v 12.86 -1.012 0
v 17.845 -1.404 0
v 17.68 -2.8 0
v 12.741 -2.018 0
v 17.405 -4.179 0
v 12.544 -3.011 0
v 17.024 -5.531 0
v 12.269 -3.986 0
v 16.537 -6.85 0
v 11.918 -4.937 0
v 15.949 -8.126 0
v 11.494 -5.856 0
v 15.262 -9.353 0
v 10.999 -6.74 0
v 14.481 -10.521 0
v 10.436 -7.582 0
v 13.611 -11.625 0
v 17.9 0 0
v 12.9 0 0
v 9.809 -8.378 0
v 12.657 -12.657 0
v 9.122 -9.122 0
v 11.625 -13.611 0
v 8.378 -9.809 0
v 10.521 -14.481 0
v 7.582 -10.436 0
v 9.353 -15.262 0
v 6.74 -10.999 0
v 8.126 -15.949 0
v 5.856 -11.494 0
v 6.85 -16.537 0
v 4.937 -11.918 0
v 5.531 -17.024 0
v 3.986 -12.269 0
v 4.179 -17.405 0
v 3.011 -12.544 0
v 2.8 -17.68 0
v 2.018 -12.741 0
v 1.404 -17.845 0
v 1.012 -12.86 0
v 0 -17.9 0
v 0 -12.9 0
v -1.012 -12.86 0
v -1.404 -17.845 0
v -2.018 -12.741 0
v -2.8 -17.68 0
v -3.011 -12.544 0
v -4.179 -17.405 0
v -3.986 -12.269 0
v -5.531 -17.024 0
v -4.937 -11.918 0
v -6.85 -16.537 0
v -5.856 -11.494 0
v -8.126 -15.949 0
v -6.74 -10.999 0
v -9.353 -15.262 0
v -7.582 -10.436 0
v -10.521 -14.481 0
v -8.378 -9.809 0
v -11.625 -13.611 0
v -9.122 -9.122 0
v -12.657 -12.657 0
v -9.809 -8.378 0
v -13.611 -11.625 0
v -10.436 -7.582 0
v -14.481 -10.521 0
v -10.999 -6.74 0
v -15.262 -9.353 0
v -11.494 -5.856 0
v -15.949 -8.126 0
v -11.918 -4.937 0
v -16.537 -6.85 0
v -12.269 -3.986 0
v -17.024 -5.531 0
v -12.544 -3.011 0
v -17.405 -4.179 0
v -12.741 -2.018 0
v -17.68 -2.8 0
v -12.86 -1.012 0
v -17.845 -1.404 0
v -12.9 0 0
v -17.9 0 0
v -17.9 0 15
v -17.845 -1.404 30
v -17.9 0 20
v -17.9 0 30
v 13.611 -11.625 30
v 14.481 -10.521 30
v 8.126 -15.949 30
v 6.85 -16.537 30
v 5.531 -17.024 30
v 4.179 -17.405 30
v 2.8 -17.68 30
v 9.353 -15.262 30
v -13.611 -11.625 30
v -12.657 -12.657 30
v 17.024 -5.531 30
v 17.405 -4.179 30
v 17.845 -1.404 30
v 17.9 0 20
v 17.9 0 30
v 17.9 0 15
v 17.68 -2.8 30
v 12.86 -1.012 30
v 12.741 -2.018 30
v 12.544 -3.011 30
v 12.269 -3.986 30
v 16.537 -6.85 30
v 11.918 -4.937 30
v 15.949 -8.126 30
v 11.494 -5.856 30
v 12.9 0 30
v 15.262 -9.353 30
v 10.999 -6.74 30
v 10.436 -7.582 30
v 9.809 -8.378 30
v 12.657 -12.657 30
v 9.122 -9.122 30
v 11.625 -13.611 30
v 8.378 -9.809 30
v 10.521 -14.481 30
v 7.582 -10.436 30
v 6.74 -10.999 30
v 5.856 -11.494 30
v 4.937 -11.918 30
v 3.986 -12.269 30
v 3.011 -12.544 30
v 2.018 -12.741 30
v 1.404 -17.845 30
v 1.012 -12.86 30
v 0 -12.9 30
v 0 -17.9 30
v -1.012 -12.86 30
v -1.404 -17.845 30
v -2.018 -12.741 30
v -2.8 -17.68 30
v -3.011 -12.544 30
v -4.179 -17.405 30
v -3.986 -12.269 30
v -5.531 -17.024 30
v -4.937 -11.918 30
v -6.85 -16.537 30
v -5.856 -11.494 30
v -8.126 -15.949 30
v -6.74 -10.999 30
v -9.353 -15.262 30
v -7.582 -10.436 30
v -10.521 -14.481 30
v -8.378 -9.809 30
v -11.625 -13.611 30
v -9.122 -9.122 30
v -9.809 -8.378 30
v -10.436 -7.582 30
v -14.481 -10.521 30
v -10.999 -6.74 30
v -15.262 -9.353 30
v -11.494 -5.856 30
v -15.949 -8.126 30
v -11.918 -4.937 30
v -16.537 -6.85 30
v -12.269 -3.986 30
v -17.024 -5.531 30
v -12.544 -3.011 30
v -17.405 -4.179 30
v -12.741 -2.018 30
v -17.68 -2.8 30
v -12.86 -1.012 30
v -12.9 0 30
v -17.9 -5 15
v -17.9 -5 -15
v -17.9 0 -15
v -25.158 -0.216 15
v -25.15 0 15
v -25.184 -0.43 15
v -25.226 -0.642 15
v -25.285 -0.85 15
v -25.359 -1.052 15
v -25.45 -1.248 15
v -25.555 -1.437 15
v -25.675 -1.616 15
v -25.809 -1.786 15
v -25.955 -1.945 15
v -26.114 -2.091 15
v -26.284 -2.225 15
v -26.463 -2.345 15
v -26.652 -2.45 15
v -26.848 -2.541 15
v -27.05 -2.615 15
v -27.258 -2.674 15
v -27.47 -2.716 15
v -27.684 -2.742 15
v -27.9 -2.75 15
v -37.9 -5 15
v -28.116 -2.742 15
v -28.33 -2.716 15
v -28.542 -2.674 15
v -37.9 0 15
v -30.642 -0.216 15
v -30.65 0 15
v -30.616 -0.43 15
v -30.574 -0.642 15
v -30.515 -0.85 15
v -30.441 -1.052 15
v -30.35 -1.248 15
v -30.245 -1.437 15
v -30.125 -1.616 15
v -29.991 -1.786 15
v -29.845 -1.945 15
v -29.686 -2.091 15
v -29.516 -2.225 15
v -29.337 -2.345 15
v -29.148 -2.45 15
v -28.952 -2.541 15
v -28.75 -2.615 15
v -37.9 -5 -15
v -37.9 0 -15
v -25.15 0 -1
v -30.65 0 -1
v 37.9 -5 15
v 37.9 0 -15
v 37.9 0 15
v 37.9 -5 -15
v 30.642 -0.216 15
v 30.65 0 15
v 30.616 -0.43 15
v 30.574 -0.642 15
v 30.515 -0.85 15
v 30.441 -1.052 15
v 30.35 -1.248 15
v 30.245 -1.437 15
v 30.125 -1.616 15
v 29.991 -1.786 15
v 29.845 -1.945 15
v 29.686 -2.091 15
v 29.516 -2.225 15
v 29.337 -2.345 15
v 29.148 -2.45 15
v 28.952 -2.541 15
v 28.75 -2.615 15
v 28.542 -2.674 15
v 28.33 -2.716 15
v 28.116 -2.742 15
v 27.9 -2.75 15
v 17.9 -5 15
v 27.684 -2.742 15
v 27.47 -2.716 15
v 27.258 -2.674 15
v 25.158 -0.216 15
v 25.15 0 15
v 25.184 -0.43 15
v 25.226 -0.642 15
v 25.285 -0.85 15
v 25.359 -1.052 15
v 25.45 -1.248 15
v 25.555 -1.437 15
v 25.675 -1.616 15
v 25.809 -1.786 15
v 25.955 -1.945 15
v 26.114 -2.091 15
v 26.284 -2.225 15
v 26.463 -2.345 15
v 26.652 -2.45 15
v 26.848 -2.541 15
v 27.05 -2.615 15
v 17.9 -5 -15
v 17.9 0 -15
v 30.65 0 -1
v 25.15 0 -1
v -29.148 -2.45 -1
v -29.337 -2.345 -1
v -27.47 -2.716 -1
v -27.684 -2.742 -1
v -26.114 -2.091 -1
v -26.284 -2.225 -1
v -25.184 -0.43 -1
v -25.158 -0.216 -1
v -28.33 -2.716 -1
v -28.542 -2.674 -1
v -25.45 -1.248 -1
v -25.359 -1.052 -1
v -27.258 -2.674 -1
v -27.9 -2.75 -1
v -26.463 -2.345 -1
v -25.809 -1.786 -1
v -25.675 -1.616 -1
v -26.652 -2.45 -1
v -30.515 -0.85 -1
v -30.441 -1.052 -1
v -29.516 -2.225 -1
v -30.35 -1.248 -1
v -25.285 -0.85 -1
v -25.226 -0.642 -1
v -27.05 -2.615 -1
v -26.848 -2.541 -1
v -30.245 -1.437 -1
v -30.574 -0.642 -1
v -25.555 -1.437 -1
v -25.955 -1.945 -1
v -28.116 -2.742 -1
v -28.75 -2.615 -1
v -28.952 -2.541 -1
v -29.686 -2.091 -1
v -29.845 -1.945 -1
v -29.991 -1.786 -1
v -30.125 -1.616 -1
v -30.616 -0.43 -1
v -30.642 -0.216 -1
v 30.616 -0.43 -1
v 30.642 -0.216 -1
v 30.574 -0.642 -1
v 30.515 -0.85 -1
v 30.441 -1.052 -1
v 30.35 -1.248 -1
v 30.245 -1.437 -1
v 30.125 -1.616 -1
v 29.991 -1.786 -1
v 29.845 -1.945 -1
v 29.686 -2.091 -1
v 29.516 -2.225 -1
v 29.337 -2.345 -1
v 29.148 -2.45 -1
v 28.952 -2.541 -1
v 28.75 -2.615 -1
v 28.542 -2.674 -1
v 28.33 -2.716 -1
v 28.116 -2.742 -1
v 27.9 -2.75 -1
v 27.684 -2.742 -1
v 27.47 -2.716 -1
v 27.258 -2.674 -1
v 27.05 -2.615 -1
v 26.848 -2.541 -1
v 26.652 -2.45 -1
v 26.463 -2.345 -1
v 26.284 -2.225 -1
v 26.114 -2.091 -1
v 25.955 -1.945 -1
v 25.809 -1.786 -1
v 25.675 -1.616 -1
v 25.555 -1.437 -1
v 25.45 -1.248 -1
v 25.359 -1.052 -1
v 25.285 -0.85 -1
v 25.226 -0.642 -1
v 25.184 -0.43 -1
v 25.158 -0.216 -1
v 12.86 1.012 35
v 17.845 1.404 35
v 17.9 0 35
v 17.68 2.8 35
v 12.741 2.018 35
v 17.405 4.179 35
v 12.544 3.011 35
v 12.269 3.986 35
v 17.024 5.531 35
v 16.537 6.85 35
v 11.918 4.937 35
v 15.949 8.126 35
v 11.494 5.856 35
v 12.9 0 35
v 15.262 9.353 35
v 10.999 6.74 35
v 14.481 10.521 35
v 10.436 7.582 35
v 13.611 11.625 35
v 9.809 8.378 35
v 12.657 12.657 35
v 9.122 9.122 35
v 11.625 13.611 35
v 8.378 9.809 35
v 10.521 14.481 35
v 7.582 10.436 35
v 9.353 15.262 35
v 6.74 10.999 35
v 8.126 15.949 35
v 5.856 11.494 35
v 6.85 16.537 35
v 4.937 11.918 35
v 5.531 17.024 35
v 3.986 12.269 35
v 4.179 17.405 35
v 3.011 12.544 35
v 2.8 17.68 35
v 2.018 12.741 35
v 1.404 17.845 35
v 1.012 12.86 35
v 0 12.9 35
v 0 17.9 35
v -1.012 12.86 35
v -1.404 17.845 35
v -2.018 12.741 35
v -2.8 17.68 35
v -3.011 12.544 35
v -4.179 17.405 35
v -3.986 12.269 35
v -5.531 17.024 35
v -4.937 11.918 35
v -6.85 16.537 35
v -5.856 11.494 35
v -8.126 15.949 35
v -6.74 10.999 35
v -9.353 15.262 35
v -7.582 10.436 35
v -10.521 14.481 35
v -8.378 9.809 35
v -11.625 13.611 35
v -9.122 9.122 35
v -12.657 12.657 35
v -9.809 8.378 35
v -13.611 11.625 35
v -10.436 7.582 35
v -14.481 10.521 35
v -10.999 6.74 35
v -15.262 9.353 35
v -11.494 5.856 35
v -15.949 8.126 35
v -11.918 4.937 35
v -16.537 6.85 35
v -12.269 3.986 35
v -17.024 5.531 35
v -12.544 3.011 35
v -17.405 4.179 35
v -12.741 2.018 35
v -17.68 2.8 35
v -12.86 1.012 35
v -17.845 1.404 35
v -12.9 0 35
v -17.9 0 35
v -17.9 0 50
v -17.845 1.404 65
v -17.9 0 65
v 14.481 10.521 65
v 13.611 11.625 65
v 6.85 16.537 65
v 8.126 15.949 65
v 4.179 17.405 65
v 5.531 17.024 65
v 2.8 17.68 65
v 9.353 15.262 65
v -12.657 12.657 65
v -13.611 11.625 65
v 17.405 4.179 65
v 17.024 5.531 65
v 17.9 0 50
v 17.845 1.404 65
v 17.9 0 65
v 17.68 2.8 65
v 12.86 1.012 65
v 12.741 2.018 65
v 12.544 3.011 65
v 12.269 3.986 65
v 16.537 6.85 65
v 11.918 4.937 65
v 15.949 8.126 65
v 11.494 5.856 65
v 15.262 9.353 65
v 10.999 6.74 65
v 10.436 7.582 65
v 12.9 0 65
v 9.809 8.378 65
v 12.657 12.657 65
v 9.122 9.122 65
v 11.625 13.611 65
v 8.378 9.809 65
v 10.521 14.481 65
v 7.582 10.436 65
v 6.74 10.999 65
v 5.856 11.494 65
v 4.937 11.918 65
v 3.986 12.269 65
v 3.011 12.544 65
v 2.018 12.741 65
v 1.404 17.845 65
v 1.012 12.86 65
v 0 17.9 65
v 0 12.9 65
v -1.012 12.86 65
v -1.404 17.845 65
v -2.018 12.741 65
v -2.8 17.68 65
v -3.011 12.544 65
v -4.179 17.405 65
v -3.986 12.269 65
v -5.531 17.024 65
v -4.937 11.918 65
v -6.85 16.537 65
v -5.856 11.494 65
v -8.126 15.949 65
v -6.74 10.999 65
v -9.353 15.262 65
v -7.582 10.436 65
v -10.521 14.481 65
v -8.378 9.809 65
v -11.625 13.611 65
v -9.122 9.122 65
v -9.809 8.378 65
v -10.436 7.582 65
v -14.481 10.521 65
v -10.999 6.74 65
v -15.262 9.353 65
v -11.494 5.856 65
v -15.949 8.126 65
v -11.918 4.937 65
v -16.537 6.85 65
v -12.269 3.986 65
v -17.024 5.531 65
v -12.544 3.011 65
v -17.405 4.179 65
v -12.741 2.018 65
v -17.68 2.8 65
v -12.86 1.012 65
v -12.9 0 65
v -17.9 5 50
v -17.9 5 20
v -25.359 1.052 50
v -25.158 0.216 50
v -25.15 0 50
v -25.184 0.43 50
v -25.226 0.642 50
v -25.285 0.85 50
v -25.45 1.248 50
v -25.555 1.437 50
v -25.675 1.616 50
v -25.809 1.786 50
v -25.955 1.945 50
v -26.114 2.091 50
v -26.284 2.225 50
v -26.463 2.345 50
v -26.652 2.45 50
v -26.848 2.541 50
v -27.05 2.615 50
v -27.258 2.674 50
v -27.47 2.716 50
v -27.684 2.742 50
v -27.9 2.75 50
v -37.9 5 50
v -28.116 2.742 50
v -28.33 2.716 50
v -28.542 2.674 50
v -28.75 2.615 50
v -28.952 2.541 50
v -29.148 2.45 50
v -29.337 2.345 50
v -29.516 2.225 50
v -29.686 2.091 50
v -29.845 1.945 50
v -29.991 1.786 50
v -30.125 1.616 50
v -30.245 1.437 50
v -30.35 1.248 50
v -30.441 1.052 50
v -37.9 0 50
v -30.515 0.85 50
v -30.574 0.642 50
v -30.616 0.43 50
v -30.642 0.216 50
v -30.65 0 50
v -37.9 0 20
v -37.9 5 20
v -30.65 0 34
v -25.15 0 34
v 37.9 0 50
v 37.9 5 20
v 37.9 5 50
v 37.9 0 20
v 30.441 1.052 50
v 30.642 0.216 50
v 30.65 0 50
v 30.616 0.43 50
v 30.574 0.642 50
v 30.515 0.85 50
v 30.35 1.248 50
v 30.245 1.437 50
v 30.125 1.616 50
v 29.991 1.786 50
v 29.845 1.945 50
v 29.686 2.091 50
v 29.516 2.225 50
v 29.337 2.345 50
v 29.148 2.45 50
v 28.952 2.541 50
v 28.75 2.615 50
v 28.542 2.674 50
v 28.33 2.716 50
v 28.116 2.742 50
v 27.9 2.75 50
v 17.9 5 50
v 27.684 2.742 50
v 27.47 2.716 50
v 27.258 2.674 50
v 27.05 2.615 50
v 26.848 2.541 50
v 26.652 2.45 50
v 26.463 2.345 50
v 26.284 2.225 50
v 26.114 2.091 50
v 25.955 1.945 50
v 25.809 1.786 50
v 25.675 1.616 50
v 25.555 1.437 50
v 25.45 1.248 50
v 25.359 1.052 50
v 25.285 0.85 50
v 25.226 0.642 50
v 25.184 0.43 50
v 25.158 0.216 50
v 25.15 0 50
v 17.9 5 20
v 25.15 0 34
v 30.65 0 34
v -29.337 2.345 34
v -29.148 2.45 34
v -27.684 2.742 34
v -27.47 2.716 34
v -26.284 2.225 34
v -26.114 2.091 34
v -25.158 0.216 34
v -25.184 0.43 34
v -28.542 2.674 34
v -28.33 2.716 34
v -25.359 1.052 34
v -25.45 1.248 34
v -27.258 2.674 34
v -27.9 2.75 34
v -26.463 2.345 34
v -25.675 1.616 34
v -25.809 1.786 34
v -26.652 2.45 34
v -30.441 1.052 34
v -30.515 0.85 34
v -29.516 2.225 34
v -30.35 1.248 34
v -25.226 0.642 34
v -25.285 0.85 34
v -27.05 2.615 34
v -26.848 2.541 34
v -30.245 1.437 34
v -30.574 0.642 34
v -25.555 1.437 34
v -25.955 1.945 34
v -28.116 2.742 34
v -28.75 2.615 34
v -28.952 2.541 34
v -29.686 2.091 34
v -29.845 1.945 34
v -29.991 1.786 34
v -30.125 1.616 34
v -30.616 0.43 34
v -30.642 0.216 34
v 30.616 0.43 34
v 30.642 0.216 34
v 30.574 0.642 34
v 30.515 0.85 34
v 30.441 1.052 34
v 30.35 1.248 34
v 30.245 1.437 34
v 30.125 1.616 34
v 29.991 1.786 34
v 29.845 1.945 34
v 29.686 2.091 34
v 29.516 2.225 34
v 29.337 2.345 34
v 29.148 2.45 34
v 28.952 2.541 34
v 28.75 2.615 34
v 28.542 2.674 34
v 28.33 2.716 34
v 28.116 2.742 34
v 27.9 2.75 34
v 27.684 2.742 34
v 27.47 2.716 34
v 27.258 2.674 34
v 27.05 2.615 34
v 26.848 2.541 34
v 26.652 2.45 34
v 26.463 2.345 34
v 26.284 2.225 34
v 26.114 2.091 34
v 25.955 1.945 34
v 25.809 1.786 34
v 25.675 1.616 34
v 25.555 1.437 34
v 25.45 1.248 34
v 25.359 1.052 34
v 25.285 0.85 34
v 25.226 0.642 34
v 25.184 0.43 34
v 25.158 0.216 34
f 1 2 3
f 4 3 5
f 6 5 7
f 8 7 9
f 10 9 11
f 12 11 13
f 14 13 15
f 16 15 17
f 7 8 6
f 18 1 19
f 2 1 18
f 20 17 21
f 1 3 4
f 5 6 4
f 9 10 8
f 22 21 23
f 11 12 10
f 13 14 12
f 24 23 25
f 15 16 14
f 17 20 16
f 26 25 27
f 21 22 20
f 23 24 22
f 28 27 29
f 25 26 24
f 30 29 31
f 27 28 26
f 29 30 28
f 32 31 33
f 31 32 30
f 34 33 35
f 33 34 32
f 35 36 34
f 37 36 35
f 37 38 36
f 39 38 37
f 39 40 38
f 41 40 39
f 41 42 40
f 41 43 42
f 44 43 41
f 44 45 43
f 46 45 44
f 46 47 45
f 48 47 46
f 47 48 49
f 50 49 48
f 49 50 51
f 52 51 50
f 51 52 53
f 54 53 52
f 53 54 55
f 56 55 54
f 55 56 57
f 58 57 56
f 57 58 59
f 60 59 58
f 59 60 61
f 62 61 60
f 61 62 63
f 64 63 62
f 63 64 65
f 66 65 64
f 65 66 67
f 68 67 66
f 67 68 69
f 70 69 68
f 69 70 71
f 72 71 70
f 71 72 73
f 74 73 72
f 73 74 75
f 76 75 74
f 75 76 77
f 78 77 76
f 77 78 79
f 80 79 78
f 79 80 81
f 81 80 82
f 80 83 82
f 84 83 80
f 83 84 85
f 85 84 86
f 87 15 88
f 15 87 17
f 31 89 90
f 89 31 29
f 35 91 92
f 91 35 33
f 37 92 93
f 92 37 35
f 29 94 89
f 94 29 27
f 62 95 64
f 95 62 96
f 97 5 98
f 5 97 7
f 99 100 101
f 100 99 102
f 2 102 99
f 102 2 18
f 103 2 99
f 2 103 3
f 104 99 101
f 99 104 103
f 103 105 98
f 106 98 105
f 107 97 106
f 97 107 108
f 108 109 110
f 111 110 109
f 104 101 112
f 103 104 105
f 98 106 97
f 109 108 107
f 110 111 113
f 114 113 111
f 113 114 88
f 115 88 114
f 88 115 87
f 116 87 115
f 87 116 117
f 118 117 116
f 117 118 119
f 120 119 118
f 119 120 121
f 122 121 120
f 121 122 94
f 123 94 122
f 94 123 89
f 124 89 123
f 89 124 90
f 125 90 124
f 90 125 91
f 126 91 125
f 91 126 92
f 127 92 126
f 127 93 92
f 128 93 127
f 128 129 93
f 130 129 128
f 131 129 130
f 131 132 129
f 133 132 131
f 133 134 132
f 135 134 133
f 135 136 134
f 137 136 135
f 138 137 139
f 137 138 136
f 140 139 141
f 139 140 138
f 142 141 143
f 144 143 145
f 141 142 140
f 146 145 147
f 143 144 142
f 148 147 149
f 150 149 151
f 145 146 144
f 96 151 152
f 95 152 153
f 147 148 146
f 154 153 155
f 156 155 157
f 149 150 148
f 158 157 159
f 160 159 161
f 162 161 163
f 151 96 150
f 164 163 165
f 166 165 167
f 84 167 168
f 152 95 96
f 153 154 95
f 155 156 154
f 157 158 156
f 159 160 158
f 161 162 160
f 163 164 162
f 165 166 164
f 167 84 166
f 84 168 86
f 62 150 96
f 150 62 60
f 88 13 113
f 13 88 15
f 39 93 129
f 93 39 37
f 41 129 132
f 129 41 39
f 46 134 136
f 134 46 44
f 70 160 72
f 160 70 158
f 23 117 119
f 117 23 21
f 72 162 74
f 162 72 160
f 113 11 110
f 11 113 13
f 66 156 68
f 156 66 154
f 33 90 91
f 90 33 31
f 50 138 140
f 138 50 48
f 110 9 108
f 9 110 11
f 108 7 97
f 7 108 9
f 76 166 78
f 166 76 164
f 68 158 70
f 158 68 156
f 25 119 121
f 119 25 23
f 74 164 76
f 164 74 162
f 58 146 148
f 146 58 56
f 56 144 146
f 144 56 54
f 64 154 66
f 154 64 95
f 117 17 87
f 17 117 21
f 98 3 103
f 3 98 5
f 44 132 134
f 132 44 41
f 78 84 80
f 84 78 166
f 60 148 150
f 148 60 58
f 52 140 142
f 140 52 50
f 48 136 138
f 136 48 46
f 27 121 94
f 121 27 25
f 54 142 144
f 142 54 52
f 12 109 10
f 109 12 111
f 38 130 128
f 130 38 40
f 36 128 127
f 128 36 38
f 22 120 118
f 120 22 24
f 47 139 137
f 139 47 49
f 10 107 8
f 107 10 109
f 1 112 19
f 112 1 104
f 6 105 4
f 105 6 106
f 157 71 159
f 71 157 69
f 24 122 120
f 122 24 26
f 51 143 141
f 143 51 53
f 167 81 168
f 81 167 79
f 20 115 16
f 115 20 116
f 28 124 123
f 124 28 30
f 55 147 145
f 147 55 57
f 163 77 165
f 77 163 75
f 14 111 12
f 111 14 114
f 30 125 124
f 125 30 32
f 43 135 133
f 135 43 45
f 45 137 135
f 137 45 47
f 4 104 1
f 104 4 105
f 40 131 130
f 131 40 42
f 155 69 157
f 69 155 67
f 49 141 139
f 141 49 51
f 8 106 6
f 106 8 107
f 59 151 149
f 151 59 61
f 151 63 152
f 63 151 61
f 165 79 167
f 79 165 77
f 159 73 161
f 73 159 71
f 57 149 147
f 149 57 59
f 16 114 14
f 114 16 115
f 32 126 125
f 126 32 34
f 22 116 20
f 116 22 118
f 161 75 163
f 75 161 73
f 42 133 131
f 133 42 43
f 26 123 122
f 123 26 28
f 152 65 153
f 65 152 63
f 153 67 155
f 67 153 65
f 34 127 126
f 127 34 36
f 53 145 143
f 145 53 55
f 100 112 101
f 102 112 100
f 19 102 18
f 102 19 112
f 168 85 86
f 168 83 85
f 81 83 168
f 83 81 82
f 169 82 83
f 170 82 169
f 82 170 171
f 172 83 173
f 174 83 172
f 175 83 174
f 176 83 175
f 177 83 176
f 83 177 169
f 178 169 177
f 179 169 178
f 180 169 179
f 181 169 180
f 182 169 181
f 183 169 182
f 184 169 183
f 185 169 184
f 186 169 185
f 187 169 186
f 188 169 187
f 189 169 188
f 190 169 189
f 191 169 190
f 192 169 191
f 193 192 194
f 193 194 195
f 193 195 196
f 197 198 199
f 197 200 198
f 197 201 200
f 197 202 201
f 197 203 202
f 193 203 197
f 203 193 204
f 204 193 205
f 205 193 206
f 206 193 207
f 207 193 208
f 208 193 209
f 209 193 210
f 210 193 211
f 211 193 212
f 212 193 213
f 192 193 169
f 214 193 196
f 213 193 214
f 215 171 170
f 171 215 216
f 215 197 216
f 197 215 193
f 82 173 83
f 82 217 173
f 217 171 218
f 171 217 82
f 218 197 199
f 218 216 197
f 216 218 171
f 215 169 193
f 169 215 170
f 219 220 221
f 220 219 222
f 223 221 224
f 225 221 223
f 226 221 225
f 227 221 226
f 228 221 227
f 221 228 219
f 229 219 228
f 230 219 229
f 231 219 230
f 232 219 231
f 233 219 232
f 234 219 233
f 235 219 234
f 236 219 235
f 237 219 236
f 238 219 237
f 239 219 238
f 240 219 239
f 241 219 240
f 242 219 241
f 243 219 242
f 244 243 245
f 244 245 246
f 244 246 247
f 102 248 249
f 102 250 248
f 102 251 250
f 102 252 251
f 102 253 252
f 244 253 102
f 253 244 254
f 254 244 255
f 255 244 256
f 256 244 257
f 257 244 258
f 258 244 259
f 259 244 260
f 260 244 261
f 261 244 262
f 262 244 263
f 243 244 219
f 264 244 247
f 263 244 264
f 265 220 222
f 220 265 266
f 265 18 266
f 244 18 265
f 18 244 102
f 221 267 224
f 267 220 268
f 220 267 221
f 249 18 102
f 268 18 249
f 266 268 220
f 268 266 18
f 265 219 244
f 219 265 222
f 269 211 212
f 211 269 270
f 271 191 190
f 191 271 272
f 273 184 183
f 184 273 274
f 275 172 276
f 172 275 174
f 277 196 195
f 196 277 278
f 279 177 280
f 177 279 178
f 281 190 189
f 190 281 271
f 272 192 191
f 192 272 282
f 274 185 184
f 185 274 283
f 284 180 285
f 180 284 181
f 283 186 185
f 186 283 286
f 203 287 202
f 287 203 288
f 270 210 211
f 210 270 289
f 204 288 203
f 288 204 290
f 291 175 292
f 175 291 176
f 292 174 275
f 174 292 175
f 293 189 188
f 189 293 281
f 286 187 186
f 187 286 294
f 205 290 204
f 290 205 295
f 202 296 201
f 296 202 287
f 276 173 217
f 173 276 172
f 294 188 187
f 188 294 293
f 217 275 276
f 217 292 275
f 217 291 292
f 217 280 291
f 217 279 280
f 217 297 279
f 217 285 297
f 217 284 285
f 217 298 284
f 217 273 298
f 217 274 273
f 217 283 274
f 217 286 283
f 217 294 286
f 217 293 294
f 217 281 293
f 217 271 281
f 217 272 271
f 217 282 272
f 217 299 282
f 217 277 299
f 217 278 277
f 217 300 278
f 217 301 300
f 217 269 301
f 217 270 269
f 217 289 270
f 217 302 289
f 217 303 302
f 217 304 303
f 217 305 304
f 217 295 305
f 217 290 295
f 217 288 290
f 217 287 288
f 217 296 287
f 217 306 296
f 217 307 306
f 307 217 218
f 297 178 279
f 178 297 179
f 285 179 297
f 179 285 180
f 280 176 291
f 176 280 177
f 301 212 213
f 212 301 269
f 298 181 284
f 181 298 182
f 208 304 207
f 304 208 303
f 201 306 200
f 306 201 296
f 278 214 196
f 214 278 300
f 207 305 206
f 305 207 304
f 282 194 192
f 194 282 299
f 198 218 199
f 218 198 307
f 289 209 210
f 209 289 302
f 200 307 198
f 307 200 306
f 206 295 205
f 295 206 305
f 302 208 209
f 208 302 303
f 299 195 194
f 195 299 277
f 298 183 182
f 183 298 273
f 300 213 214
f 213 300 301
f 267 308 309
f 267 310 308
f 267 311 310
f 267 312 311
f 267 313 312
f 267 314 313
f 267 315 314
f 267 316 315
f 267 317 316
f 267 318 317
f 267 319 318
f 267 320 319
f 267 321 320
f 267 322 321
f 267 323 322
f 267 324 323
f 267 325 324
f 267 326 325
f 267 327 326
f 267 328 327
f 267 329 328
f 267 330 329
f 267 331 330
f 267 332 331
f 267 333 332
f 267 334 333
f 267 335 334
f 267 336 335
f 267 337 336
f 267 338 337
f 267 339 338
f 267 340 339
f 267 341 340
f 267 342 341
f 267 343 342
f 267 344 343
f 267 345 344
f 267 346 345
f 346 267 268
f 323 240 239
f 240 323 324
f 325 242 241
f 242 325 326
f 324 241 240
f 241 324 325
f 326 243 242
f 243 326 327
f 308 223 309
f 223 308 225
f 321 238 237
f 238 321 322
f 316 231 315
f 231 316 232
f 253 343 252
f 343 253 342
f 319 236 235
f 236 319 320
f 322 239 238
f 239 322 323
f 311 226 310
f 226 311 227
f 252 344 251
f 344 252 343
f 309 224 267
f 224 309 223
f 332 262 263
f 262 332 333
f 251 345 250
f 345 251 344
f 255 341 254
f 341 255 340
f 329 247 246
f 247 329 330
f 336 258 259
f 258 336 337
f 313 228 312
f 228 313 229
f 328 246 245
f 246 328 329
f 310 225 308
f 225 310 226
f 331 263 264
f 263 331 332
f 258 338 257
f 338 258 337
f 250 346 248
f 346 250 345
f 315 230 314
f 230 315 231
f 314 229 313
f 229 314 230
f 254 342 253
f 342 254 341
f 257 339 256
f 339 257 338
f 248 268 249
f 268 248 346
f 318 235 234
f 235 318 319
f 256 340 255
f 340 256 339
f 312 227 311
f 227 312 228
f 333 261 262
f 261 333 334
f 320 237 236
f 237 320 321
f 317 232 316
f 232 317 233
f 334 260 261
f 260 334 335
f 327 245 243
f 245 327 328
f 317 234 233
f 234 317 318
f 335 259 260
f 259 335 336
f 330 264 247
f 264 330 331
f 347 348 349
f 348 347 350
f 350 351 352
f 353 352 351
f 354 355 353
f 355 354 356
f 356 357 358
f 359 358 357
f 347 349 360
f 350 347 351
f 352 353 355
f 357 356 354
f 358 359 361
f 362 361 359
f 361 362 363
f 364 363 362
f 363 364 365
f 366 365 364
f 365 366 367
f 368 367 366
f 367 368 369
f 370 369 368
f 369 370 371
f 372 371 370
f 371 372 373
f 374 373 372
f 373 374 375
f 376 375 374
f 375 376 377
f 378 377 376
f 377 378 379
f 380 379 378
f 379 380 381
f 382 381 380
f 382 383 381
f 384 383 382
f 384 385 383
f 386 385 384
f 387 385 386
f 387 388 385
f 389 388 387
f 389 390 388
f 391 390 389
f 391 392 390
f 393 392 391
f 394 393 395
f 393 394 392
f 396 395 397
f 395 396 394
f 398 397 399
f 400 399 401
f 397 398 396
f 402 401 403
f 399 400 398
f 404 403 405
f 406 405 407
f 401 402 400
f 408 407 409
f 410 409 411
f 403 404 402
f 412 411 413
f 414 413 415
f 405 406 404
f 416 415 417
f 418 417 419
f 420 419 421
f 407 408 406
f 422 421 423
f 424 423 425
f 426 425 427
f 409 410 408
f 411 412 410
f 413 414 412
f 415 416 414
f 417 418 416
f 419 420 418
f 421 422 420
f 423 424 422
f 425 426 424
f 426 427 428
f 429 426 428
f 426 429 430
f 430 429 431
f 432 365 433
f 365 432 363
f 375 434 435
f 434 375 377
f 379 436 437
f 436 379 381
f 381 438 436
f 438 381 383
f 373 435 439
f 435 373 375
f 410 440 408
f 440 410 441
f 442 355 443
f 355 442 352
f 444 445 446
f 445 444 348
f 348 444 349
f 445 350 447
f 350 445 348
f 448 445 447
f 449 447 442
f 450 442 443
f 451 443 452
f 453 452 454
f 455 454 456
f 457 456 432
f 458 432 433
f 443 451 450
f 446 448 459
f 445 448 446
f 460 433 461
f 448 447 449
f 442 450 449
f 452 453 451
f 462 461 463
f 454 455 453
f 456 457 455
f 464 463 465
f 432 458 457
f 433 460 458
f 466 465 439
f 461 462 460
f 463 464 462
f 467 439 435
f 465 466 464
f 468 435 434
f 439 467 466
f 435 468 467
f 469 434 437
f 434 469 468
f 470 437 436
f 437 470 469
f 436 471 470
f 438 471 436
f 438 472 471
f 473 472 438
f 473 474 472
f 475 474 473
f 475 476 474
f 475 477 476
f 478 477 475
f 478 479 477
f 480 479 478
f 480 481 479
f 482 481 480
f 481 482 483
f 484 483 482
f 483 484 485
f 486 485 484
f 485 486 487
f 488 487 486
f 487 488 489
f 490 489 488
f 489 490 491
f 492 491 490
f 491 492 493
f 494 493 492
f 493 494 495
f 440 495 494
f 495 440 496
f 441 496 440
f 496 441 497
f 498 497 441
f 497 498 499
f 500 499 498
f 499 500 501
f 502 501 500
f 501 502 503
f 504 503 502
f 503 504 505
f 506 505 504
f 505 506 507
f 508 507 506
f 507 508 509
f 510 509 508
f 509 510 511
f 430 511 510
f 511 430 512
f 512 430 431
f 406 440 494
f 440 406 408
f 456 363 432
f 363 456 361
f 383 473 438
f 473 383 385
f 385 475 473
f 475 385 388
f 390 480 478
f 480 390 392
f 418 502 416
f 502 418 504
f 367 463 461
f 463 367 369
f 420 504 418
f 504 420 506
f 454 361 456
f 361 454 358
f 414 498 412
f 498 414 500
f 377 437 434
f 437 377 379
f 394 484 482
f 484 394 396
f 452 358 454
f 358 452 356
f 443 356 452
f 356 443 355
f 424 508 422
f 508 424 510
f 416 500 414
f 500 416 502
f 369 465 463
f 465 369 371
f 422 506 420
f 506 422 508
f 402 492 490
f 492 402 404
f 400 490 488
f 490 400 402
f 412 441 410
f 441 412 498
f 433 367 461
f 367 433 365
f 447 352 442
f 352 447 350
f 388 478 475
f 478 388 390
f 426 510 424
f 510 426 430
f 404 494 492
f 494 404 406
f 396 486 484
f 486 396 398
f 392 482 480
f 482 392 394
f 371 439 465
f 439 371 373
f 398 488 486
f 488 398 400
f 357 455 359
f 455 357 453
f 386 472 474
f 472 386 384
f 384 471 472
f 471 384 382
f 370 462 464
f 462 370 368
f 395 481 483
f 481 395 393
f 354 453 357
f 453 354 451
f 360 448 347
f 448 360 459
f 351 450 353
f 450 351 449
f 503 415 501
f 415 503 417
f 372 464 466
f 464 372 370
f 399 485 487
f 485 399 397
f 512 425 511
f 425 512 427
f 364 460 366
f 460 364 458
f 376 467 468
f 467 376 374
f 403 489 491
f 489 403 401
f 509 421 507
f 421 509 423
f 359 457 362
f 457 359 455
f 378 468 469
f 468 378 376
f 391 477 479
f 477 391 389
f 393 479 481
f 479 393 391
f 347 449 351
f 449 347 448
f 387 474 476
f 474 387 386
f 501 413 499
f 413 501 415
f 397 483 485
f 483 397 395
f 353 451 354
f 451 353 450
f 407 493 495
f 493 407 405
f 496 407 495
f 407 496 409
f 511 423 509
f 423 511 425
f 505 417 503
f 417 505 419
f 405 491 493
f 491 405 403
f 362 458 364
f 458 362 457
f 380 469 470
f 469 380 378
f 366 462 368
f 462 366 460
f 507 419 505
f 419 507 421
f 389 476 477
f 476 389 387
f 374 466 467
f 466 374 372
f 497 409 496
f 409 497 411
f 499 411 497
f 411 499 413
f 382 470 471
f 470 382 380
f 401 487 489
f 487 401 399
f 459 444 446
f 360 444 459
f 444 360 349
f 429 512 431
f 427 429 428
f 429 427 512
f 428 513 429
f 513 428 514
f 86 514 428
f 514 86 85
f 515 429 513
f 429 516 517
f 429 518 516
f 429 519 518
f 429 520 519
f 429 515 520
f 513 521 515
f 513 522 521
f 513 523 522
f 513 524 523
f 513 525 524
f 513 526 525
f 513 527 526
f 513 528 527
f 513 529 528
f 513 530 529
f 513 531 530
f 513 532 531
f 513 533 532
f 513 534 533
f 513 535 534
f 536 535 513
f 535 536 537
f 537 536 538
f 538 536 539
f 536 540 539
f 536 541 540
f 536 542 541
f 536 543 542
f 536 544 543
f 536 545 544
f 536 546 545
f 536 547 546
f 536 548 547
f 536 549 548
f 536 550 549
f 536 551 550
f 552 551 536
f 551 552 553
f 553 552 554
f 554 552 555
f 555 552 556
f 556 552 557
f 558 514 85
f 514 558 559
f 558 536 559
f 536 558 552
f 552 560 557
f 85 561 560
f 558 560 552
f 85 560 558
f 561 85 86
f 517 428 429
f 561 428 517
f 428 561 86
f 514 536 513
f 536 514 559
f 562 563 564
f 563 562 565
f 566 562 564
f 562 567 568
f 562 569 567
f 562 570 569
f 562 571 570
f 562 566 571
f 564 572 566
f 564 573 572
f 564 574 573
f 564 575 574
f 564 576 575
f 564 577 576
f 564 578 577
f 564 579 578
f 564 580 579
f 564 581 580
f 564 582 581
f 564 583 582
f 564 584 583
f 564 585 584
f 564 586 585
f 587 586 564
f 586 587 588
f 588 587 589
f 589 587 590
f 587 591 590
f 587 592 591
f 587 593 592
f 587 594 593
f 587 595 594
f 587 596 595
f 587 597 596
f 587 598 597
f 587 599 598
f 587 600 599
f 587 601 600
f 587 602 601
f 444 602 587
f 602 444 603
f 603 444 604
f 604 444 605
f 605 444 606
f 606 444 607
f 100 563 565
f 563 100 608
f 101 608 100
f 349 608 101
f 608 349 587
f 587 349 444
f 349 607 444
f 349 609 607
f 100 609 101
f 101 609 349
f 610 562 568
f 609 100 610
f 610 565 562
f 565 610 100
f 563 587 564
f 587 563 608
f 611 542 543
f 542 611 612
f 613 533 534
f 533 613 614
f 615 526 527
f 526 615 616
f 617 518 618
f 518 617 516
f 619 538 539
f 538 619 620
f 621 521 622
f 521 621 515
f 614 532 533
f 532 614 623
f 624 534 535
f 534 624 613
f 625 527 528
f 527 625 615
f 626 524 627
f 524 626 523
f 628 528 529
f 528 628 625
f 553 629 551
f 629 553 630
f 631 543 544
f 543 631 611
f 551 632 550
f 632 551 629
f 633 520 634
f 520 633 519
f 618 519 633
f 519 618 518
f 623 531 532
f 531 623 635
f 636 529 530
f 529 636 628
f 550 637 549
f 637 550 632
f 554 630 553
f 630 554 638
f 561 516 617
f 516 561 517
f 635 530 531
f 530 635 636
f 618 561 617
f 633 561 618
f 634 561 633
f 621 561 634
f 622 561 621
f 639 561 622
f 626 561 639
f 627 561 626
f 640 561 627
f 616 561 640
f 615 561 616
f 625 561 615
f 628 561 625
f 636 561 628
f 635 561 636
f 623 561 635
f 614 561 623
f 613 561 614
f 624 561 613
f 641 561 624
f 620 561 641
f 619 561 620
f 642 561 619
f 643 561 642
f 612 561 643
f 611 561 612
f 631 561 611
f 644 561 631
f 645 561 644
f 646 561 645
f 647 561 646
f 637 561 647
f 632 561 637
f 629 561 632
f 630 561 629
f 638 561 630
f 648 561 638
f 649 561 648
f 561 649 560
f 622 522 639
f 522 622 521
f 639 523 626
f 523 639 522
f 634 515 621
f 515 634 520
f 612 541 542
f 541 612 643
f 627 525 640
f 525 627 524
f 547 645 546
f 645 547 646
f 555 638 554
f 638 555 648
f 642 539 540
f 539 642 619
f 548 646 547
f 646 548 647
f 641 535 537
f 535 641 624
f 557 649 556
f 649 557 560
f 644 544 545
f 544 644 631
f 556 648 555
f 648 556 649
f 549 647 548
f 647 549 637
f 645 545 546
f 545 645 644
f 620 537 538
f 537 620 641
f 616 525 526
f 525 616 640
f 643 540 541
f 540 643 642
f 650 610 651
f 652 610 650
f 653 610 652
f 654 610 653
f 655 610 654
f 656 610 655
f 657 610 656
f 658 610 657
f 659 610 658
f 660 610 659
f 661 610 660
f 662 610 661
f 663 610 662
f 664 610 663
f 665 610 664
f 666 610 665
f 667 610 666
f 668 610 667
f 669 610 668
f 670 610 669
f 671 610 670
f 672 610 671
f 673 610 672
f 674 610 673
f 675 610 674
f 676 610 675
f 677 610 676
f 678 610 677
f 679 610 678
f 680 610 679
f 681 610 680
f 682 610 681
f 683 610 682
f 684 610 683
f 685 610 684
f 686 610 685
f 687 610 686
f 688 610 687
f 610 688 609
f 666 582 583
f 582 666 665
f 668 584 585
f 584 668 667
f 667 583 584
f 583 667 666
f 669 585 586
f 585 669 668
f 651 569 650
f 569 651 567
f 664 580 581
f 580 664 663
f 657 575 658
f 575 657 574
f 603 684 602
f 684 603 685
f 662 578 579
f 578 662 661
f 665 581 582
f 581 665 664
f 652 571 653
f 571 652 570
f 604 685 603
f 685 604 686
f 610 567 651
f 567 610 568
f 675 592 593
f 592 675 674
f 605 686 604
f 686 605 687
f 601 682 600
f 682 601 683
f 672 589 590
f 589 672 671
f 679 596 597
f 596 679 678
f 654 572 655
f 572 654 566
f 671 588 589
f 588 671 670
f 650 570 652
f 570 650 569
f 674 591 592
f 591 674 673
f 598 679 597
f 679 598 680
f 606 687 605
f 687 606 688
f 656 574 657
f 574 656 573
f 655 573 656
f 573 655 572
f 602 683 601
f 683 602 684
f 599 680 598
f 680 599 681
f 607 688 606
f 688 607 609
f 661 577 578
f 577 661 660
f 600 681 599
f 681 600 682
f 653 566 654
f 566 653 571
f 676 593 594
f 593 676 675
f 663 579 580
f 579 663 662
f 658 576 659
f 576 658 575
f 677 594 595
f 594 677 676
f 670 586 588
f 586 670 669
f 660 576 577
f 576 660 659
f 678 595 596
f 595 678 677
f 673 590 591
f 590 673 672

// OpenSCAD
// ============================================================
// PART 3: Enclosure Post Clamp (x2 needed)
// Clamps IP67 enclosure to a 1" (25.4mm) aluminum pole.
// Two-piece design: base wraps pole, top bolts through
// enclosure mounting flange.
//
// Print: PETG or ABS, 100% infill, 0.2mm layer height
// Hardware: 2x M5 bolts + nuts per clamp (buy a small pack)
// Replaces: "U-Bolt Pipe Clamps" ($8 for 2)
// ============================================================

// --- Parameters ---
pole_dia       = 25.4;  // mm — 1 inch OD pole
pole_clearance = 0.4;   // mm — print tolerance
clamp_wall     = 5;     // mm — wall thickness around pole
clamp_width    = 30;    // mm — width of clamp along pole axis
flange_w       = 20;    // mm — bolt flange width each side
flange_t       = 5;     // mm — bolt flange thickness
bolt_dia       = 5.5;   // mm — M5 clearance

pole_r = (pole_dia + pole_clearance) / 2;
outer_r = pole_r + clamp_wall;

$fn = 80;

// Bottom half — wraps around lower half of pole
module clamp_bottom() {
    difference() {
        union() {
            // Half-cylinder cradle
            translate([0, 0, 0])
                difference() {
                    cylinder(h = clamp_width, r = outer_r);
                    translate([0, 0, -1])
                        cylinder(h = clamp_width + 2, r = pole_r);
                    // Cut top half off
                    translate([-outer_r - 1, 0, -1])
                        cube([outer_r*2 + 2, outer_r + 1, clamp_width + 2]);
                }
            
            // Bolt flanges (left and right)
            for (side = [-1, 1])
                translate([side * (outer_r + flange_w/2), -flange_t/2, 0])
                    cube([flange_w, flange_t, clamp_width], center=true);
        }
        
        // Bolt holes through flanges
        for (side = [-1, 1])
            translate([side * (outer_r + flange_w/2), 0, clamp_width/2])
                rotate([0, 0, 0])
                    cylinder(h = clamp_width + 2, d = bolt_dia, center=true);
    }
}

// Top half — mirror of bottom, bolts to enclosure
module clamp_top() {
    mirror([0, 1, 0])
        clamp_bottom();
}

// Show both halves
clamp_bottom();
translate([0, 0, clamp_width + 5])
    clamp_top();
